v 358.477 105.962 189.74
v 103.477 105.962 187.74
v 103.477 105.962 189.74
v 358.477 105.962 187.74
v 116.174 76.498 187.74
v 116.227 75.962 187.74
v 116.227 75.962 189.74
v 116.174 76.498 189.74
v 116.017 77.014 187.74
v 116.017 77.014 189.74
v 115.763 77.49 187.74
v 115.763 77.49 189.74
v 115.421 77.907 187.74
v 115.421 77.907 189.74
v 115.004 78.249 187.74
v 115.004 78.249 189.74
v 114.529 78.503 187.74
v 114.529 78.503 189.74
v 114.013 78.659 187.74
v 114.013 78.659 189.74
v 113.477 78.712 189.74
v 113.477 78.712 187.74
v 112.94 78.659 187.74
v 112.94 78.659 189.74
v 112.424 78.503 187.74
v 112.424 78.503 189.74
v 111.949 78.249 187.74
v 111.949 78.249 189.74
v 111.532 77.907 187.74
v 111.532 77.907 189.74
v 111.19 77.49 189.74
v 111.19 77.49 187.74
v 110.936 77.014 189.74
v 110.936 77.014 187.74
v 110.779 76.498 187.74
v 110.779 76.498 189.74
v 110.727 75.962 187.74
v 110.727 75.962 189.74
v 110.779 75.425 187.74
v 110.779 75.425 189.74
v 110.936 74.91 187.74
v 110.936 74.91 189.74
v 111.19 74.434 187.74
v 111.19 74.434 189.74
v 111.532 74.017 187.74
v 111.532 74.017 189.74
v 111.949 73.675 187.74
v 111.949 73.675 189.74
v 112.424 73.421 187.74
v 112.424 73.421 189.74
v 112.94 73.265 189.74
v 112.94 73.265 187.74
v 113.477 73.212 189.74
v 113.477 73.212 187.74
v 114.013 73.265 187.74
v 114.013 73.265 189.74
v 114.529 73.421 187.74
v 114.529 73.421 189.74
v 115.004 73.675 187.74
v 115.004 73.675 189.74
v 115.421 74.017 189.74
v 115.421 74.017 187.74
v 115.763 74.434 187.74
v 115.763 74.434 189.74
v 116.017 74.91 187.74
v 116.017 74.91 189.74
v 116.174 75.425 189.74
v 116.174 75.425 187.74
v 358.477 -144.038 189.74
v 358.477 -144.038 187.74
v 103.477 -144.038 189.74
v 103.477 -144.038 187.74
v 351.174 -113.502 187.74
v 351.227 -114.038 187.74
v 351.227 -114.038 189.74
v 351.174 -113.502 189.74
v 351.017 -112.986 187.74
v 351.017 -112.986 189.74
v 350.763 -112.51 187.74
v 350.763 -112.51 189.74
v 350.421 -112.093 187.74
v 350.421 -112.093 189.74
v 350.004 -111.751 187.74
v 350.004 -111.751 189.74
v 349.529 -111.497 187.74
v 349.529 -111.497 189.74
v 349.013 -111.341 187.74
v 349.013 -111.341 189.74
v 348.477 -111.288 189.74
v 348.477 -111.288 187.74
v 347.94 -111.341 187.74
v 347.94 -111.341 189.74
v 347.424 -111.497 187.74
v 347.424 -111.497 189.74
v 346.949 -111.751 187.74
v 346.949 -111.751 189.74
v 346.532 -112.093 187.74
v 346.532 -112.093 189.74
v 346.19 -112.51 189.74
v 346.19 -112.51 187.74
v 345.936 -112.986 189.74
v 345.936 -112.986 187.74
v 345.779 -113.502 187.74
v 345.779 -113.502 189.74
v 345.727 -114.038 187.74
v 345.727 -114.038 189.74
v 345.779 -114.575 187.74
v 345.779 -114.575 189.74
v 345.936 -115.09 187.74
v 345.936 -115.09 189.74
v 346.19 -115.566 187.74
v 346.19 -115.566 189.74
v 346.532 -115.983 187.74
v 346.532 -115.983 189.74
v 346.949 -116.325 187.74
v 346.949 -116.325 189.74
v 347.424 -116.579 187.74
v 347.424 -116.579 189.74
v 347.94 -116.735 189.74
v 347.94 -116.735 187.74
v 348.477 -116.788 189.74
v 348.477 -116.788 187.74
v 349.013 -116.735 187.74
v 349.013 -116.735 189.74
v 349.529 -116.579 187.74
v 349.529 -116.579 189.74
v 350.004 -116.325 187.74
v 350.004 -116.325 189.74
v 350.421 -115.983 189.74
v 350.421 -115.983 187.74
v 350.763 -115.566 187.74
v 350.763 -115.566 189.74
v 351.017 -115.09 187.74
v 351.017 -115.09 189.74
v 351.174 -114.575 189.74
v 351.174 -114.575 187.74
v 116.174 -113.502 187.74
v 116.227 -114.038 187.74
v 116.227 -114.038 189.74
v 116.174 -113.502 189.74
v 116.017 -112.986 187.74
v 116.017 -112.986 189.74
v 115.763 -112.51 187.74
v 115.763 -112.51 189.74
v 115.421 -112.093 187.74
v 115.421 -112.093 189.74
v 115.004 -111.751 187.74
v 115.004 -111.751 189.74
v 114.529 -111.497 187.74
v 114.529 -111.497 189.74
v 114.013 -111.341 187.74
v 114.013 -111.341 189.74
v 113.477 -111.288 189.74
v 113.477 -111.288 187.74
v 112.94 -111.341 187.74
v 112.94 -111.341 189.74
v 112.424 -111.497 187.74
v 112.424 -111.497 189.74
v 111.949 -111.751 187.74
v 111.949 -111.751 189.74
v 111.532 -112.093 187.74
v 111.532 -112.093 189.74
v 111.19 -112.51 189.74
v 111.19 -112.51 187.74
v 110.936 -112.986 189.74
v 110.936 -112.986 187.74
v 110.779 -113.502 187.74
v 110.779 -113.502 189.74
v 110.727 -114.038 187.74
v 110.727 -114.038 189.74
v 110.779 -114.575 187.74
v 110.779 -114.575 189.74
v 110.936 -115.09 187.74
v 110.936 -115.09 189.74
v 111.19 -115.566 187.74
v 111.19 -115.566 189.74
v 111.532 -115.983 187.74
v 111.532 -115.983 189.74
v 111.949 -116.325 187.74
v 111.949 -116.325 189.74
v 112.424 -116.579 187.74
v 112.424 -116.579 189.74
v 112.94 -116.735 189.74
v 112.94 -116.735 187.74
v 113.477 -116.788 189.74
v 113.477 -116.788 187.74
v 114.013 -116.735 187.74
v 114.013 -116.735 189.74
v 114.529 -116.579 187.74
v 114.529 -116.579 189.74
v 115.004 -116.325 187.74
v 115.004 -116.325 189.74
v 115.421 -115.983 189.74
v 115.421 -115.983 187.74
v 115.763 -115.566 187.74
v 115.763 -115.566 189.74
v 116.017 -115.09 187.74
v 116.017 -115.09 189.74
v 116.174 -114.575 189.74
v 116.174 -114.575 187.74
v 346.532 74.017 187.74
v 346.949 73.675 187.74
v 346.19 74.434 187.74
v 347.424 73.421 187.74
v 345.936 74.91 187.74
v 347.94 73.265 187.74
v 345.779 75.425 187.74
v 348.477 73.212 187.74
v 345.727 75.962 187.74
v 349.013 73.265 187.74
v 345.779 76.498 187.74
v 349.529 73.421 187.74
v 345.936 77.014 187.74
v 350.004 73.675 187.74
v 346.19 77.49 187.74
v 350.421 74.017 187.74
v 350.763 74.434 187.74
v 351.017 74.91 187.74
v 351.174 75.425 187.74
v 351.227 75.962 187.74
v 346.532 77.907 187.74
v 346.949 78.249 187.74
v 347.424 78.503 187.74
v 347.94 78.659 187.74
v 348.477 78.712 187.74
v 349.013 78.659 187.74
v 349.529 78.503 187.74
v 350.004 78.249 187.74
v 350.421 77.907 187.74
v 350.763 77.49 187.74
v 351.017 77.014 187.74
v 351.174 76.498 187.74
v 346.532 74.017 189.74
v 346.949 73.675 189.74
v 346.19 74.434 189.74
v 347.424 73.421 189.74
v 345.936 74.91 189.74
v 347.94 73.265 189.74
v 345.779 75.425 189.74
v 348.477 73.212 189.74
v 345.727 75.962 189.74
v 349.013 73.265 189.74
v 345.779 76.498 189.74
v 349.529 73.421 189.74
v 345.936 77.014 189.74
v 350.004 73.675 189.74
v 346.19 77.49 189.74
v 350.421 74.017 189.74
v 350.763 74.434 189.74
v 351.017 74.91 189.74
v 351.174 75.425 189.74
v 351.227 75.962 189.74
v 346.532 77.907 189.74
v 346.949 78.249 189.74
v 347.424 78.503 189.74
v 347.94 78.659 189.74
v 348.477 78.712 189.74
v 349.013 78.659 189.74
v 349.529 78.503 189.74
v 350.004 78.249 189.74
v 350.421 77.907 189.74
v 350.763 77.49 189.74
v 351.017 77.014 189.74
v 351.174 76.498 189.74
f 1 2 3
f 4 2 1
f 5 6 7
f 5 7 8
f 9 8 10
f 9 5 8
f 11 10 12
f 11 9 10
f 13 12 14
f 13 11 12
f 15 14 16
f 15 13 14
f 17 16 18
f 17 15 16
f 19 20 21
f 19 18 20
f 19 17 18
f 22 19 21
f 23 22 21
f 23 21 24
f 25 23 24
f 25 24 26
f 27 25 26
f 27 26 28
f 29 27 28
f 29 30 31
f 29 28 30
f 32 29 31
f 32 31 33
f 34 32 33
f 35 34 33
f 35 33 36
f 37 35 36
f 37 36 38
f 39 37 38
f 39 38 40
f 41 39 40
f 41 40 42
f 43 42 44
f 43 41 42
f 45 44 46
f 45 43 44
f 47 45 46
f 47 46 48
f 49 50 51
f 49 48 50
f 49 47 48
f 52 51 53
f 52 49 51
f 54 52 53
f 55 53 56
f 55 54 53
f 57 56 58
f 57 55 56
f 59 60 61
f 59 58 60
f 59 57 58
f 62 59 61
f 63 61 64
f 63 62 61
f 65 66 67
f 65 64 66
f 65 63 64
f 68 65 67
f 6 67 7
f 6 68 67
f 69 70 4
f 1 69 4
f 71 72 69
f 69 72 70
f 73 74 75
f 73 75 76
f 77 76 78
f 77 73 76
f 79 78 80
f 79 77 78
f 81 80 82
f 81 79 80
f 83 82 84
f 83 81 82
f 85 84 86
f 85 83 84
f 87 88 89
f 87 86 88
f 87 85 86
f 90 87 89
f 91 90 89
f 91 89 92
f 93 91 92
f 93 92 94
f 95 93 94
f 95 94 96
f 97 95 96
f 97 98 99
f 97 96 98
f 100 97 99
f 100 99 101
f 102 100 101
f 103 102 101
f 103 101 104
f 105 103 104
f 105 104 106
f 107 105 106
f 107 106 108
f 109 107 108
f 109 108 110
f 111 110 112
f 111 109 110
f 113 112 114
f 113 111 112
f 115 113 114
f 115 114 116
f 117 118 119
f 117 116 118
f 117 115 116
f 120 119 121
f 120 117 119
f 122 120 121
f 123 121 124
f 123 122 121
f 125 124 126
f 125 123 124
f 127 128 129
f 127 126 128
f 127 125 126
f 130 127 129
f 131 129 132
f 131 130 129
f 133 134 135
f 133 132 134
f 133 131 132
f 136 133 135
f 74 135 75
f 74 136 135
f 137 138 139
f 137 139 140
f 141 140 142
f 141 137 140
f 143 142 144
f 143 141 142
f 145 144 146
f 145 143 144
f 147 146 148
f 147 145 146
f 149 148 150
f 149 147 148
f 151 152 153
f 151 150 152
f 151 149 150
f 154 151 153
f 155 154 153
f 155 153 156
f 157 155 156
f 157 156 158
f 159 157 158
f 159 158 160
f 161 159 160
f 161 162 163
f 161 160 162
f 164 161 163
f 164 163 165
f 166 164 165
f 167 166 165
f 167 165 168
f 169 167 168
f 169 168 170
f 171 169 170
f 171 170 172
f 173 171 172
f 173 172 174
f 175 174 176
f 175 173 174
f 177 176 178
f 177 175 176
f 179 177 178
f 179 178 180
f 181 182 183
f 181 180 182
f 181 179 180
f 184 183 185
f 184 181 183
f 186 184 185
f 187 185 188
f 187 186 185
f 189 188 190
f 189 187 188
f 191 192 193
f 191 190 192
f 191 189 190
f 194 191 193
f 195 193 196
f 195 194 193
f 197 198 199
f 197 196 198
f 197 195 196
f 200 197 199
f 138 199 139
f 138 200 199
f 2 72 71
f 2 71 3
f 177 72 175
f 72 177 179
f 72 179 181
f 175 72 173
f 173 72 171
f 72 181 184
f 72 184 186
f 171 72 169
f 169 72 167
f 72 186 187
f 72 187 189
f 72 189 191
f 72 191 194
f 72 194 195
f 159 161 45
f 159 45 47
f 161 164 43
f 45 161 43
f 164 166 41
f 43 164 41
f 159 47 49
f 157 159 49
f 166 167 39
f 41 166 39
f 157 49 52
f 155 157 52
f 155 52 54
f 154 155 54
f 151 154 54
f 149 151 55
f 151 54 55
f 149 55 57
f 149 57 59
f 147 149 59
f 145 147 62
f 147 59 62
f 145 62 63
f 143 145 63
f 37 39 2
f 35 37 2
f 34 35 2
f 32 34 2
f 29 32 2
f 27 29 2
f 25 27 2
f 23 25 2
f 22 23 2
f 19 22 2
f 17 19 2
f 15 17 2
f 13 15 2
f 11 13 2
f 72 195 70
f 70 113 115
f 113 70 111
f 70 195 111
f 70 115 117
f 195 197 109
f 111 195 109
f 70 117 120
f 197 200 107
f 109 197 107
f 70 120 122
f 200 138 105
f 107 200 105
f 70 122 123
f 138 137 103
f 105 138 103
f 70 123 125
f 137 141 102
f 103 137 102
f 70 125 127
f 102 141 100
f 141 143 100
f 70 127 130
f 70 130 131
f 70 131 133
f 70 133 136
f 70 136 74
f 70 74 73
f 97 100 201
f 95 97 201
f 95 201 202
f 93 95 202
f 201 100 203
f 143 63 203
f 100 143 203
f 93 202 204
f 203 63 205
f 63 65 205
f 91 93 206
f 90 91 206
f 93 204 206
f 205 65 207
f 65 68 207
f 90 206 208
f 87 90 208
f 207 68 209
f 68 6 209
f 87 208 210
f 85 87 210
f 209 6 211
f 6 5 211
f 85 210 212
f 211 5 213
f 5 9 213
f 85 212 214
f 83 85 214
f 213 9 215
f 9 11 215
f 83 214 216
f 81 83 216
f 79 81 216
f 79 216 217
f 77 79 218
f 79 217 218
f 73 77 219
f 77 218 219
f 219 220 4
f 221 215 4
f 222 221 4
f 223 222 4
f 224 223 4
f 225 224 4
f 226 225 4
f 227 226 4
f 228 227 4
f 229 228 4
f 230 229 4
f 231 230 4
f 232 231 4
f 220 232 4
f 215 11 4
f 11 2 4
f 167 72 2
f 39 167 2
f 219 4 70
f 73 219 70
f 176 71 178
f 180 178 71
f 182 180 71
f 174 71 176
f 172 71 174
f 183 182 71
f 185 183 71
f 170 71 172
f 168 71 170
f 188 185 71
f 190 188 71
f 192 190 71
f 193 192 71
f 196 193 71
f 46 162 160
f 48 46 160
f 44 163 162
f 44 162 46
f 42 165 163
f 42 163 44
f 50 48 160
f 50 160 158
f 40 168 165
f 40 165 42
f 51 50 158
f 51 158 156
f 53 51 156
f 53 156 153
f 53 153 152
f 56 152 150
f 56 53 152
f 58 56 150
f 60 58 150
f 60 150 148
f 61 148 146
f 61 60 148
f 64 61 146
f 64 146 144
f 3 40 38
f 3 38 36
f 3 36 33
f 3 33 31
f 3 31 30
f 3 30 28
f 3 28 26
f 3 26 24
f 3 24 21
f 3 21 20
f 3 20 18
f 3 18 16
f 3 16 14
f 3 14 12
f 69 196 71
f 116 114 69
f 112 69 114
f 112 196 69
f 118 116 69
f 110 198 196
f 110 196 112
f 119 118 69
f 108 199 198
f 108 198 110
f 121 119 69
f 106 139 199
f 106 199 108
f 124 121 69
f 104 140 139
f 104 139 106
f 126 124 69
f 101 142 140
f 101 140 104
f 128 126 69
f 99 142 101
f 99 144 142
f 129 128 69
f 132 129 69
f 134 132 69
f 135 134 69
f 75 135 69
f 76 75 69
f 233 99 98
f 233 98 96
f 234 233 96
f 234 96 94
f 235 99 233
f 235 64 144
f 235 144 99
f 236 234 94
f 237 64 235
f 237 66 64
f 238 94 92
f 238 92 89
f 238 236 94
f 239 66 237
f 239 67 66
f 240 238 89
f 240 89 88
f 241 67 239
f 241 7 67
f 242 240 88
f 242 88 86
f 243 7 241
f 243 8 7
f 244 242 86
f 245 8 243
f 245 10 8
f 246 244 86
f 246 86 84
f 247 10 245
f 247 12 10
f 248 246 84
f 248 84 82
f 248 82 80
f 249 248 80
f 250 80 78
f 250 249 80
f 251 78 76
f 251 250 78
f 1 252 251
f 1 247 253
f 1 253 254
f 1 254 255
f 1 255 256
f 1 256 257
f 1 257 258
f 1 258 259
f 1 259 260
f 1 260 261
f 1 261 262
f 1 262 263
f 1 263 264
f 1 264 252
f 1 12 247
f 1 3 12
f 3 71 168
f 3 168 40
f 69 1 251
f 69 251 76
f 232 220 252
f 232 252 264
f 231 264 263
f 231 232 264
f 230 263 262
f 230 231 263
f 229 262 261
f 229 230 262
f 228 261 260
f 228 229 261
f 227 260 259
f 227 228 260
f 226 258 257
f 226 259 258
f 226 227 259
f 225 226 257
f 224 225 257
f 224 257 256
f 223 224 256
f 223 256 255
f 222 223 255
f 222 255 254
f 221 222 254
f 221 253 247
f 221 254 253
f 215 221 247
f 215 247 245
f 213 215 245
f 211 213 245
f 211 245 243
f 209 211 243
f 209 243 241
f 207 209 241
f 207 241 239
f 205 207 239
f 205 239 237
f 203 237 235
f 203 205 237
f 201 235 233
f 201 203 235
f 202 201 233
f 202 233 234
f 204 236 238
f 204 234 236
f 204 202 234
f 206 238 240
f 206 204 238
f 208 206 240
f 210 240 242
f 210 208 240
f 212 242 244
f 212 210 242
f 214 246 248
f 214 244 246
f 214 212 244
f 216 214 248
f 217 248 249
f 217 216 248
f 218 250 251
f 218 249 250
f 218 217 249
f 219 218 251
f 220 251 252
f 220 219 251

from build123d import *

# Parameters (mm, degrees)
CYLINDER007_R     = 2.75
CYLINDER007_DEPTH = 10
CYLINDER006_R     = 2.75
CYLINDER006_DEPTH = 10
CYLINDER005_R     = 2.75
CYLINDER005_DEPTH = 10
CYLINDER004_R     = 2.75
CYLINDER004_DEPTH = 10
BOX001_W          = 255
BOX001_H          = 250
BOX001_DEPTH      = 2


with BuildPart() as cylinder007:
    # Cylinder007 → Cylinder007 (new body)
    with BuildSketch(Plane(origin=(245, 220, -5), x_dir=(1, 0, 0), z_dir=(0, 0, 1))):
        Circle(CYLINDER007_R)
    extrude(amount=CYLINDER007_DEPTH)


with BuildPart() as cylinder006:
    # Cylinder006 → Cylinder006 (new body)
    with BuildSketch(Plane(origin=(245, 30, -5), x_dir=(1, 0, 0), z_dir=(0, 0, 1))):
        Circle(CYLINDER006_R)
    extrude(amount=CYLINDER006_DEPTH)


with BuildPart() as cylinder005:
    # Cylinder005 → Cylinder005 (new body)
    with BuildSketch(Plane(origin=(10, 220, -5), x_dir=(1, 0, 0), z_dir=(0, 0, 1))):
        Circle(CYLINDER005_R)
    extrude(amount=CYLINDER005_DEPTH)


with BuildPart() as cylinder004:
    # Cylinder004 → Cylinder004 (new body)
    with BuildSketch(Plane(origin=(10, 30, -5), x_dir=(1, 0, 0), z_dir=(0, 0, 1))):
        Circle(CYLINDER004_R)
    extrude(amount=CYLINDER004_DEPTH)


with BuildPart() as side:
    # Box001 → Box001 (new body)
    with BuildSketch(Plane.XY.offset(0)):
        with Locations((127.5, 125)):
            Rectangle(BOX001_W, BOX001_H)
    extrude(amount=BOX001_DEPTH)

    # Cut004: cut Cylinder004
    add(cylinder004.part, mode=Mode.SUBTRACT)

    # Cut005: cut Cylinder005
    add(cylinder005.part, mode=Mode.SUBTRACT)

    # Cut006: cut Cylinder006
    add(cylinder006.part, mode=Mode.SUBTRACT)

    # Cut007: cut Cylinder007
    add(cylinder007.part, mode=Mode.SUBTRACT)


with BuildPart() as side_1:
    # Cut007 placement: moved
    add(side.part.moved(Location((103.476654, -144.038025, 187.740341))))


solid = side_1.part
